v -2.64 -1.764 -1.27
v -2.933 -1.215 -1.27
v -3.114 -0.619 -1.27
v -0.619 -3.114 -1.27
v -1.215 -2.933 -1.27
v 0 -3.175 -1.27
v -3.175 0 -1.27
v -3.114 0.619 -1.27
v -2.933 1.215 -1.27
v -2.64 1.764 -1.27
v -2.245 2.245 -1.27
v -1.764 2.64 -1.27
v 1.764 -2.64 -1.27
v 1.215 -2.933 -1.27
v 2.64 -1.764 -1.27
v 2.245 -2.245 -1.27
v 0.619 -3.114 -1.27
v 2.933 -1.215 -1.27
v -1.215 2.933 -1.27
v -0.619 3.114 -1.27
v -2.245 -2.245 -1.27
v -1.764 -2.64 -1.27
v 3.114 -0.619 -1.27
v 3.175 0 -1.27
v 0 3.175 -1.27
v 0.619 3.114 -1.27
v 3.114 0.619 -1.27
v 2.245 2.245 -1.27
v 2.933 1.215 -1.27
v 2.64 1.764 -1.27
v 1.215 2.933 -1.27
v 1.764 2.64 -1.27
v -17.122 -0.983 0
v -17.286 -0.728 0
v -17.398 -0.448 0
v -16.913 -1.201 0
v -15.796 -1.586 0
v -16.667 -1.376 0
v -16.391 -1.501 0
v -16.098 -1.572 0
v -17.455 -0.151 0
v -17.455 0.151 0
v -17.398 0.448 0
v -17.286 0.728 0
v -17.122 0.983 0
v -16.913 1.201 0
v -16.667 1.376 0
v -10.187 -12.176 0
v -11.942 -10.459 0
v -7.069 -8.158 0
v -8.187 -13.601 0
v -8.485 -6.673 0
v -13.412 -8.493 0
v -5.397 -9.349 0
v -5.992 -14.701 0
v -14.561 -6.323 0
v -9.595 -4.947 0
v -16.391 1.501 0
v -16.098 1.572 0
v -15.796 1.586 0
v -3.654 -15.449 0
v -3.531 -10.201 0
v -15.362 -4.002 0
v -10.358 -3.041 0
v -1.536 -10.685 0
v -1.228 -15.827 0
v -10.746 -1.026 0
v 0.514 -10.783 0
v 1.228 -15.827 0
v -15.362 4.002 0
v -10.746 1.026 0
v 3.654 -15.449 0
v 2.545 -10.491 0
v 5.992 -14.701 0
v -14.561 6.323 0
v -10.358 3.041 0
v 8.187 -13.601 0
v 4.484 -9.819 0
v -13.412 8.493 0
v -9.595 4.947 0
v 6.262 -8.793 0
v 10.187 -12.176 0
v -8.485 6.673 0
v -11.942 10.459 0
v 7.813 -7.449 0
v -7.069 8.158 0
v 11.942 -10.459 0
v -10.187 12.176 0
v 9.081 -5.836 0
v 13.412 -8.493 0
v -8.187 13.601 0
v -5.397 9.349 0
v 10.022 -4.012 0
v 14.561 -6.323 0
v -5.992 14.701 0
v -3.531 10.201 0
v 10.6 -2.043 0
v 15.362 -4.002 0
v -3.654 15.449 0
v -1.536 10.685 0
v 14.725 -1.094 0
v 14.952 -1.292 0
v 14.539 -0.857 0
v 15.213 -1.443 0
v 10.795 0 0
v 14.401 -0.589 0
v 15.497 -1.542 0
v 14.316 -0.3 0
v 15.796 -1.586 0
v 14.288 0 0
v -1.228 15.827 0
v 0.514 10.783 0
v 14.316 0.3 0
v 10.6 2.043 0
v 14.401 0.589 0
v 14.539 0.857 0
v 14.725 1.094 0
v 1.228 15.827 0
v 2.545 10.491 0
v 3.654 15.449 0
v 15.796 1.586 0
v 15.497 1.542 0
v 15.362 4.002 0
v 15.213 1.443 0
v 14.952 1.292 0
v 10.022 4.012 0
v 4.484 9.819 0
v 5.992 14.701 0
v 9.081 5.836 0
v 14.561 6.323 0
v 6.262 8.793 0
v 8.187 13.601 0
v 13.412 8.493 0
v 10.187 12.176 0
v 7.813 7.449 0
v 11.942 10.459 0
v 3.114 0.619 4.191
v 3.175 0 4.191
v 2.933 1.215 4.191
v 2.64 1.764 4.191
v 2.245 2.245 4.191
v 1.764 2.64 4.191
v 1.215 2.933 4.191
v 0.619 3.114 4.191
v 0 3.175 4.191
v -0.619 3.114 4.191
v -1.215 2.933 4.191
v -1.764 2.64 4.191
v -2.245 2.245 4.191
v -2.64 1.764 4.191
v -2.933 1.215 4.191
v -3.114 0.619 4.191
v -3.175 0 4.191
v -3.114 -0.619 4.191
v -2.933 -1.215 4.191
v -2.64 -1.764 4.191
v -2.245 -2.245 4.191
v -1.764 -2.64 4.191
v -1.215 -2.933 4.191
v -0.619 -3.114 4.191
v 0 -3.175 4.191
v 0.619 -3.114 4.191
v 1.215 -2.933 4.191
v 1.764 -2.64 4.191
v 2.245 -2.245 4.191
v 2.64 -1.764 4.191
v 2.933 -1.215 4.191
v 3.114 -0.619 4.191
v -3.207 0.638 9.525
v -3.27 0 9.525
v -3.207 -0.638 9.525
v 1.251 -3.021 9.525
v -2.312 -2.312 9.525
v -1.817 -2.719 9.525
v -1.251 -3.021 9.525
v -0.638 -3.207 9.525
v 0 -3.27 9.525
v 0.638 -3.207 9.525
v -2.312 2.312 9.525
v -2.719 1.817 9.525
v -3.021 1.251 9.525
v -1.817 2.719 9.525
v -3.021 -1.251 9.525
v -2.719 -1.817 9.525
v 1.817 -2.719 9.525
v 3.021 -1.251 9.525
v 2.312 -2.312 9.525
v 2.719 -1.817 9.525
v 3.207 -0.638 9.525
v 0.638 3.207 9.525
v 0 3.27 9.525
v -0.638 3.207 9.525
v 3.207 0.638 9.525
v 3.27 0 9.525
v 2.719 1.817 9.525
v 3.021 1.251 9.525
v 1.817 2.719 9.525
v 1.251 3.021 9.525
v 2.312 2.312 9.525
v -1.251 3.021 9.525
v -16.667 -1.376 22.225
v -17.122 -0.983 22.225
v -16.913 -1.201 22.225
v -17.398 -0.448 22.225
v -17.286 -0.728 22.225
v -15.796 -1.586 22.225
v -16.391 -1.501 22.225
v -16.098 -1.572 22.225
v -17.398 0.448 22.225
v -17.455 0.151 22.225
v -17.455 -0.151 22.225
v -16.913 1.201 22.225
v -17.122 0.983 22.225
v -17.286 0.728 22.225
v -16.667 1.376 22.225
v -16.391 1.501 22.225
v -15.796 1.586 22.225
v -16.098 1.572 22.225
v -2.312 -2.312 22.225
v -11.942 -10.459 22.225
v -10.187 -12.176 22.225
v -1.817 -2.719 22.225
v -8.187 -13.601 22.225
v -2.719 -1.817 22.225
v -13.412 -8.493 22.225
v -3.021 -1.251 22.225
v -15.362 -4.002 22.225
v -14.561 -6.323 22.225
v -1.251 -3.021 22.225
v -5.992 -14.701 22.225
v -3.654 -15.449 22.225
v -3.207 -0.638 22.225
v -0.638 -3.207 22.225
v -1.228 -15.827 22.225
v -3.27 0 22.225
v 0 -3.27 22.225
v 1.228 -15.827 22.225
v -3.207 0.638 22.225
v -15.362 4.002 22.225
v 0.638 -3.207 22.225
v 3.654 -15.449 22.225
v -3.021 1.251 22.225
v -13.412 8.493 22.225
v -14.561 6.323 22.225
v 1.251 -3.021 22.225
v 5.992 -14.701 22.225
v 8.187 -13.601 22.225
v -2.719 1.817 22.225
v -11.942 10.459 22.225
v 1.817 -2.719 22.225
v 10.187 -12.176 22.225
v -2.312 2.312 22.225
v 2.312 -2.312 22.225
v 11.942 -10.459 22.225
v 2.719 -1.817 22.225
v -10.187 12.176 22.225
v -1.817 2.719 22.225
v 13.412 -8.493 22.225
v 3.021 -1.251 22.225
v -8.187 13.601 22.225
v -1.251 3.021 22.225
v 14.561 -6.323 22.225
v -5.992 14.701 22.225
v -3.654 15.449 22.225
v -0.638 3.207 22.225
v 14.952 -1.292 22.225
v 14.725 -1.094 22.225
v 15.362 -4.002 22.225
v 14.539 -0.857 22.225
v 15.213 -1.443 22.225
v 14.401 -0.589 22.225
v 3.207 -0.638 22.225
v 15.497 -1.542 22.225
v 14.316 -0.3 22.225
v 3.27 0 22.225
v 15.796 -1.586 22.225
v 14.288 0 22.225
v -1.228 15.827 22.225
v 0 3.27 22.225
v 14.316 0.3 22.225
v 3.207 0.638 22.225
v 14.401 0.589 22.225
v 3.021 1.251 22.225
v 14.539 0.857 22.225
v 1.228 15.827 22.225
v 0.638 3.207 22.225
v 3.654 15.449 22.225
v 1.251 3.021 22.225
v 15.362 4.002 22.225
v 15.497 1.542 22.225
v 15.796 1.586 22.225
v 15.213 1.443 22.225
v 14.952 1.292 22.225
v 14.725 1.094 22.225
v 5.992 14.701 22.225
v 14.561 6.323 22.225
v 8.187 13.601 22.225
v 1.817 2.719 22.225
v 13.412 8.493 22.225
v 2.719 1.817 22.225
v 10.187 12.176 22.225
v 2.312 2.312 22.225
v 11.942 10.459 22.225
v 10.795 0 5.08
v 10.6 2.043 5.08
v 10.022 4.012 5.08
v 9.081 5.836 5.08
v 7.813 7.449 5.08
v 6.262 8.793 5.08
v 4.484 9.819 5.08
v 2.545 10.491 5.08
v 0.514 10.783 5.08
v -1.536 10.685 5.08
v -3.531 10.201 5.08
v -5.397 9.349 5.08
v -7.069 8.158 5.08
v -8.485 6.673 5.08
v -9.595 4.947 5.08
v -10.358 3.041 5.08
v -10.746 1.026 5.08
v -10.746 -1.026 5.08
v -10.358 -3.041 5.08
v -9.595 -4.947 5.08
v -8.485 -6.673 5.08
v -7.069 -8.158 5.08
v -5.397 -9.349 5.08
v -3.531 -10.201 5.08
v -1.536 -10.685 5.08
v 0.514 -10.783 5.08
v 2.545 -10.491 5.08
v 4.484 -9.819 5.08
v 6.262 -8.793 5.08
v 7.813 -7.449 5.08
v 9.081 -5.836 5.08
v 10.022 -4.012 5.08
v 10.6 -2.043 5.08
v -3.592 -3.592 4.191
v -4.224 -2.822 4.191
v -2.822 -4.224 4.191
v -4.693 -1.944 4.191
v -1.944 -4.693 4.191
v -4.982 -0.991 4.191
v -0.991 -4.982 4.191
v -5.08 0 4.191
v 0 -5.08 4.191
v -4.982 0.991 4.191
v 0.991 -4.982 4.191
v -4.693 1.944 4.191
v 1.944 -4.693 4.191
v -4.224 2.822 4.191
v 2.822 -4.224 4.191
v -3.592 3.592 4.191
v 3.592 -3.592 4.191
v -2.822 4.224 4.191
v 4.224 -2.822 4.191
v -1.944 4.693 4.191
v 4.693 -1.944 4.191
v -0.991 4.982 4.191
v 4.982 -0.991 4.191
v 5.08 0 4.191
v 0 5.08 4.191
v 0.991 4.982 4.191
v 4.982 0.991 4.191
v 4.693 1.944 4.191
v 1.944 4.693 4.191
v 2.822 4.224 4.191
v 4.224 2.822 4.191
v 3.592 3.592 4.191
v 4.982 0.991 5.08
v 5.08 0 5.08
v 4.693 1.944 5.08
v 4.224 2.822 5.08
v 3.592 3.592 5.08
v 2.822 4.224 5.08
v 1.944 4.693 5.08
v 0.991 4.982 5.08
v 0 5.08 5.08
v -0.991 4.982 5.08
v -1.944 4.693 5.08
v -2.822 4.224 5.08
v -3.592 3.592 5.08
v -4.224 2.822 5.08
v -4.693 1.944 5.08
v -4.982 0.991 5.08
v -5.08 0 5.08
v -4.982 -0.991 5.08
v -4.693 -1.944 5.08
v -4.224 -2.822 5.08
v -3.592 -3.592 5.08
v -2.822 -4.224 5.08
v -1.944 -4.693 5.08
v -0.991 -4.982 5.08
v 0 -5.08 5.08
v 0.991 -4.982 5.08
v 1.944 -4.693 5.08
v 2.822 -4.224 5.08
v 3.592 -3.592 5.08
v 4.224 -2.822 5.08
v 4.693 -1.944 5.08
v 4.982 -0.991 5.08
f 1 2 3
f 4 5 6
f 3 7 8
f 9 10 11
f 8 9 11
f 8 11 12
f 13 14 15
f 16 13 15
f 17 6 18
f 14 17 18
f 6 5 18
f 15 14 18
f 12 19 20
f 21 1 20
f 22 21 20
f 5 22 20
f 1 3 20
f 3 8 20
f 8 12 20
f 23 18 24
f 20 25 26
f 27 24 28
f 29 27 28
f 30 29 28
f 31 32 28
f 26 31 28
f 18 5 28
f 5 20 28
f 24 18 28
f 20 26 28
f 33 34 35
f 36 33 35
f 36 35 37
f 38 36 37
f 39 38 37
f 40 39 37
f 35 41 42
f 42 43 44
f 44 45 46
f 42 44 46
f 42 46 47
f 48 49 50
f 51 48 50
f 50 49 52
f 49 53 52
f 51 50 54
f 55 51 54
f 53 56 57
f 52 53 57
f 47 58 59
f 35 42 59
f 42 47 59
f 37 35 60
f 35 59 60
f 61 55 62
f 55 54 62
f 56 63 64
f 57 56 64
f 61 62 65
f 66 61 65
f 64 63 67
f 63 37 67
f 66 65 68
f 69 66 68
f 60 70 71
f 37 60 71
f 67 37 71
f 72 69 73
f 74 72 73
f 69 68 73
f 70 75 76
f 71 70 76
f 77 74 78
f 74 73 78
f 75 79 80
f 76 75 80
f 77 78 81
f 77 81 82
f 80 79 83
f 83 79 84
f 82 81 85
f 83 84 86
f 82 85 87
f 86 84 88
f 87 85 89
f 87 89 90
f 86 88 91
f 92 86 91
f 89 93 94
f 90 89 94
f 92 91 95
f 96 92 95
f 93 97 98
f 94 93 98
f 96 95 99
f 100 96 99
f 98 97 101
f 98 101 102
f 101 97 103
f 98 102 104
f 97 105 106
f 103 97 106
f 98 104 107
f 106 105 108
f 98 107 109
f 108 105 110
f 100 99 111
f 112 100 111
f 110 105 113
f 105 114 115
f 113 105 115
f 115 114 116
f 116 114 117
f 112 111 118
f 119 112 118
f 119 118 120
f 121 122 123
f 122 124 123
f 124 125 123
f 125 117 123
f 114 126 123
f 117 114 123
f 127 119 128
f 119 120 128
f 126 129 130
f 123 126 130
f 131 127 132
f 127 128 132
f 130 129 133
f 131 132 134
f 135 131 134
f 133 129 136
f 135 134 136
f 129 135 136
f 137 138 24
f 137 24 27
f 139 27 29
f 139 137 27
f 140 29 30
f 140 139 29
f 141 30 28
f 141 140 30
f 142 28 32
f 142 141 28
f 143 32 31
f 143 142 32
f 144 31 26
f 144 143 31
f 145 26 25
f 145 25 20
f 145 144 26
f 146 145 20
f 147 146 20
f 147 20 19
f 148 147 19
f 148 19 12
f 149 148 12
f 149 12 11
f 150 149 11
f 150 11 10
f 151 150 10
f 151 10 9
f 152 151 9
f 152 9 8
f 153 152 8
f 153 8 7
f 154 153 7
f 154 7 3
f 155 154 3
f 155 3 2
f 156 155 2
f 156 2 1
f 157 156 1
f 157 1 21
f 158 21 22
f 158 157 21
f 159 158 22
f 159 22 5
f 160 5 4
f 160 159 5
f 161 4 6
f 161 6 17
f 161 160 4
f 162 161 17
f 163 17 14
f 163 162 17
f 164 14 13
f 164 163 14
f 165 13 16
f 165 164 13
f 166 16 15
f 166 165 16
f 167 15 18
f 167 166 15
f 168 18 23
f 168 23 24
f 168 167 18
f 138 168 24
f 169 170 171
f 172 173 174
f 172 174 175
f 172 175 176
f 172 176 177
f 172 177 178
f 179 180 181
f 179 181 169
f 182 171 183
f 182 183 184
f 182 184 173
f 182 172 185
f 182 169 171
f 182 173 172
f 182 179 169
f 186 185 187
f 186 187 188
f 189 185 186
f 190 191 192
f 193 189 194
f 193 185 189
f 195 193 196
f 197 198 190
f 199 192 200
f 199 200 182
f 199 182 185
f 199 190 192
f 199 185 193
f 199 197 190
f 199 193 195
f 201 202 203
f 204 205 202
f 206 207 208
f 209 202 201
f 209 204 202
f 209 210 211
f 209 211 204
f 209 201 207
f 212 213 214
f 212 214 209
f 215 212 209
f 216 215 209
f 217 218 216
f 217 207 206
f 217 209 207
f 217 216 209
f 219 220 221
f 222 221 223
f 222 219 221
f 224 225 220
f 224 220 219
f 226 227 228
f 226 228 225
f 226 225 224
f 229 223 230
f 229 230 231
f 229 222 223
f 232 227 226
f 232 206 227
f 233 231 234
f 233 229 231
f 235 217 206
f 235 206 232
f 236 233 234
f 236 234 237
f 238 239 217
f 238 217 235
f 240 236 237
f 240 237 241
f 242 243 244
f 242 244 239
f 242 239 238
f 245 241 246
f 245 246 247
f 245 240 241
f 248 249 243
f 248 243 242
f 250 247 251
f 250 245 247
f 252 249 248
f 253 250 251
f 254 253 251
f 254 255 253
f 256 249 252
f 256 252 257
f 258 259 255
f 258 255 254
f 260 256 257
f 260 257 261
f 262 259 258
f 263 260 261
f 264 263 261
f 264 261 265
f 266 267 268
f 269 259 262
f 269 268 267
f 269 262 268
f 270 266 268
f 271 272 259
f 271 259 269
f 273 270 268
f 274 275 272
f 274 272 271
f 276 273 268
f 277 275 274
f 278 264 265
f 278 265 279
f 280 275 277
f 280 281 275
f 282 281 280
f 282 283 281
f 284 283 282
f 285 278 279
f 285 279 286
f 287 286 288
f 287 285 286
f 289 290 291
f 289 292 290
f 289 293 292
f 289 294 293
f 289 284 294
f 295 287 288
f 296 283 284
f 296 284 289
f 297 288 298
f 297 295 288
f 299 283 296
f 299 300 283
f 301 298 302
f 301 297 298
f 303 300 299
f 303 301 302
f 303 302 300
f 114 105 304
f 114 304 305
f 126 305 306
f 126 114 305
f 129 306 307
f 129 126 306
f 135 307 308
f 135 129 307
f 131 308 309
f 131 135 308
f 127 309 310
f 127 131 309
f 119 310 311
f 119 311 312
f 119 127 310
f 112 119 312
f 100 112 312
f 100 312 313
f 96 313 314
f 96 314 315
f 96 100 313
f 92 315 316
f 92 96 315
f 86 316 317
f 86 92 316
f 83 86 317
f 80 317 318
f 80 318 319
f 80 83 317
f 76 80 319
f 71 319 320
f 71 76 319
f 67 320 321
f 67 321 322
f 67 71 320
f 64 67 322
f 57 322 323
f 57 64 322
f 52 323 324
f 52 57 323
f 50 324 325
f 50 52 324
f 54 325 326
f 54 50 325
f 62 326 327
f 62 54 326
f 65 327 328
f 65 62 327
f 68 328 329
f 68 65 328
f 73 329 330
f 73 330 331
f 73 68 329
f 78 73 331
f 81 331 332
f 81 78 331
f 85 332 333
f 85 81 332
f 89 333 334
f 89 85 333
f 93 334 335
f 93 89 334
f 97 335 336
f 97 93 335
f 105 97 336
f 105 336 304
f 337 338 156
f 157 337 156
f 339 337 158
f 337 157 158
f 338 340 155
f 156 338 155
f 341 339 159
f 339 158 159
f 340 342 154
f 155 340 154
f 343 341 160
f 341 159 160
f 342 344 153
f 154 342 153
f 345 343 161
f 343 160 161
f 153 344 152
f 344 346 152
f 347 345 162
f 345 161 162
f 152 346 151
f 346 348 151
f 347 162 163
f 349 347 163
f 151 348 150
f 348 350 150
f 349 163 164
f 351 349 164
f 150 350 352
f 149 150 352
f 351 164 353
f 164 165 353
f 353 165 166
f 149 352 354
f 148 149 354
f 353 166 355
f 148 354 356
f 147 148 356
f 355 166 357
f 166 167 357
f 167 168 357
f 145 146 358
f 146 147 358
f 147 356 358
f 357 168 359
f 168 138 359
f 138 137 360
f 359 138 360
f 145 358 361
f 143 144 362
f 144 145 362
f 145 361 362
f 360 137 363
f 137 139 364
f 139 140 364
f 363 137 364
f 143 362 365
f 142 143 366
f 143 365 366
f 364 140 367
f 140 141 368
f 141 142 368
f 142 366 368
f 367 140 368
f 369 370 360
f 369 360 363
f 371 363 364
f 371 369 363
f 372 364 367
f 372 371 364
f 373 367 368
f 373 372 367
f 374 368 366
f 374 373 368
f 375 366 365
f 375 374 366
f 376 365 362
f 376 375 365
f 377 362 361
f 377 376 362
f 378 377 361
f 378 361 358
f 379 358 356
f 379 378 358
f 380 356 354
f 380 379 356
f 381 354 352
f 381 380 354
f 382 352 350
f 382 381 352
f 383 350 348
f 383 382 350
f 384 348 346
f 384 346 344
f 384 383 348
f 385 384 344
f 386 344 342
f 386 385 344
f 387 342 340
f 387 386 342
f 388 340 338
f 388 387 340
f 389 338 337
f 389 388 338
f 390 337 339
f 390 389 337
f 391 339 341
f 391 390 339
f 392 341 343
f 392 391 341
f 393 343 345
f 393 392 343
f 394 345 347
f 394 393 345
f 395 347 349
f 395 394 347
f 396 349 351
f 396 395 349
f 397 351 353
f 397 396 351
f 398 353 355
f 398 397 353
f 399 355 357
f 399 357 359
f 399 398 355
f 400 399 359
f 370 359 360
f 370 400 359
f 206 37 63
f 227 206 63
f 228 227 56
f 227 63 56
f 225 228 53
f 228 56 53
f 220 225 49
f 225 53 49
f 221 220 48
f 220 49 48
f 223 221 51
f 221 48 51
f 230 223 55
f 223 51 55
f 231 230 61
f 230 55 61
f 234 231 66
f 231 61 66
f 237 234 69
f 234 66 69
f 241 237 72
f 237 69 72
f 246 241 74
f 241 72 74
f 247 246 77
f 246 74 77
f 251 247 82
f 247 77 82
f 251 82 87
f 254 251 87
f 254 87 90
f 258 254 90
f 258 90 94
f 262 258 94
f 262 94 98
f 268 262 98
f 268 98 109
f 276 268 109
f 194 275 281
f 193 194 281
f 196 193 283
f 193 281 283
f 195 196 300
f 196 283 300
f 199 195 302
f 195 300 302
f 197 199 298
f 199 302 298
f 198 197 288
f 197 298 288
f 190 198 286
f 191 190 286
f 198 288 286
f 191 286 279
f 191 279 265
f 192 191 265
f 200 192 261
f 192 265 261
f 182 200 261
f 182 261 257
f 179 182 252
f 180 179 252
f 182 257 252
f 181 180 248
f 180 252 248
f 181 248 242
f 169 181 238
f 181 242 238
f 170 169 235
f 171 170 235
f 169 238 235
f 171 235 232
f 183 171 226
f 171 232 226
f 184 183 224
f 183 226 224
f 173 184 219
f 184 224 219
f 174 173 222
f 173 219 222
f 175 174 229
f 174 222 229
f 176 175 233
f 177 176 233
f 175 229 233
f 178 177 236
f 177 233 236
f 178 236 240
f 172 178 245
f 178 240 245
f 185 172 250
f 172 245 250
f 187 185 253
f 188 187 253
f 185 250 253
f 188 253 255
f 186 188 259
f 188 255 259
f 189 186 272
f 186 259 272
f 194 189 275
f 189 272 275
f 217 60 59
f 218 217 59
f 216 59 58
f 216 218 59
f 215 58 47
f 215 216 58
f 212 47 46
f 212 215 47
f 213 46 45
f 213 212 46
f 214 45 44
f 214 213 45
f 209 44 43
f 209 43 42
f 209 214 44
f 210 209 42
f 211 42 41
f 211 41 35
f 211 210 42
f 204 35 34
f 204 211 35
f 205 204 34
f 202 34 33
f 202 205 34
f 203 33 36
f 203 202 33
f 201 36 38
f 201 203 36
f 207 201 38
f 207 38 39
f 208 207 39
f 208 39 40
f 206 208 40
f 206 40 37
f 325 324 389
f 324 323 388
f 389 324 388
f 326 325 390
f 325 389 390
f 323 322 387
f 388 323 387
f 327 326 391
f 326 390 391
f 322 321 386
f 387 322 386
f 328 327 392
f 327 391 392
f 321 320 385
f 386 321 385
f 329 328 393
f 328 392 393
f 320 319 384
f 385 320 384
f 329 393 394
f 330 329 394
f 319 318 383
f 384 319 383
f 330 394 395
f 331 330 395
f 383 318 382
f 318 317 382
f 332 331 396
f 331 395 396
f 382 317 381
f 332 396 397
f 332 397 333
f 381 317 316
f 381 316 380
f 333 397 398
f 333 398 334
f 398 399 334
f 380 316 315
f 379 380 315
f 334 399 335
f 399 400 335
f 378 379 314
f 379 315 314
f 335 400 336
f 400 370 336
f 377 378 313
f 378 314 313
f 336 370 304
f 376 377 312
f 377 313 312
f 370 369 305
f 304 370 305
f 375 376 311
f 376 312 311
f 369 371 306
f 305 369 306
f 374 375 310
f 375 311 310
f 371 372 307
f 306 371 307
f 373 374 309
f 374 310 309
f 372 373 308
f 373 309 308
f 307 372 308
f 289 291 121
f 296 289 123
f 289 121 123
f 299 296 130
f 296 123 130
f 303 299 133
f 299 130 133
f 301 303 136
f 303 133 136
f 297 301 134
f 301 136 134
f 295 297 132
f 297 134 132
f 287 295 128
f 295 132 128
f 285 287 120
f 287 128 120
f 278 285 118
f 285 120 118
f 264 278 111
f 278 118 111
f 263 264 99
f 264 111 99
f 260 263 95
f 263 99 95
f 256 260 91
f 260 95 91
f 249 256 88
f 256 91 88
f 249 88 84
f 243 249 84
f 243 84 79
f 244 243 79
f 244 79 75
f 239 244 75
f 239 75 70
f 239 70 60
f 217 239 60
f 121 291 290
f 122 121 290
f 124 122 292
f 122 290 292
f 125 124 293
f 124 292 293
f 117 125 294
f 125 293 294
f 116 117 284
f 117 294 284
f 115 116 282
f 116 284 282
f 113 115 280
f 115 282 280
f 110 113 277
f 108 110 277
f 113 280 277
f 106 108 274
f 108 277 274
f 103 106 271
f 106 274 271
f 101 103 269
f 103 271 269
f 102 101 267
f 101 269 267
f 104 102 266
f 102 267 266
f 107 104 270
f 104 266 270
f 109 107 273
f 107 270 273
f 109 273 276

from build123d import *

# Parameters (mm, degrees)
SKETCH1_R           = 15.875
BOSS_EXTRUDE1_DEPTH = 22.225
SKETCH1_3_R         = 10.795
CUT_EXTRUDE1_DEPTH  = 5.08
BOSS_EXTRUDE2_START = 5.08
SKETCH1_4_R         = 5.08
BOSS_EXTRUDE2_DEPTH = 0.889
BOSS_EXTRUDE3_START = 5.08
SKETCH1_5_R         = 3.175
BOSS_EXTRUDE3_DEPTH = 6.35
SKETCH2_R           = 3.27025
CUT_EXTRUDE2_DEPTH  = 12.7
SKETCH3_R           = 1.5875
CUT_EXTRUDE4_DEPTH  = 24.495
SKETCH3_3_R         = 1.5875
BOSS_EXTRUDE4_DEPTH = 22.225


with BuildPart() as part:
    # Sketch1 → Boss-Extrude1 (new body)
    with BuildSketch(Plane.XY):
        Circle(SKETCH1_R)
    extrude(amount=BOSS_EXTRUDE1_DEPTH)

    # Sketch1<3> → Cut-Extrude1 (cut)
    with BuildSketch(Plane.XY):
        Circle(SKETCH1_3_R)
    extrude(amount=CUT_EXTRUDE1_DEPTH, mode=Mode.SUBTRACT)

    # Sketch1<4> → Boss-Extrude2 (add)
    with BuildSketch(Plane.XY.offset(BOSS_EXTRUDE2_START)):
        Circle(SKETCH1_4_R)
    extrude(amount=-BOSS_EXTRUDE2_DEPTH)

    # Sketch1<5> → Boss-Extrude3 (add)
    with BuildSketch(Plane.XY.offset(BOSS_EXTRUDE3_START)):
        Circle(SKETCH1_5_R)
    extrude(amount=-BOSS_EXTRUDE3_DEPTH)

    # Sketch2 → Cut-Extrude2 (cut)
    with BuildSketch(Plane.XY.offset(22.225)):
        Circle(SKETCH2_R)
    extrude(amount=-CUT_EXTRUDE2_DEPTH, mode=Mode.SUBTRACT)

    # Sketch3 → Cut-Extrude4 (cut, through all)
    with BuildSketch(Plane.XY.offset(22.225)):
        with Locations((15.875, 0)):
            Circle(SKETCH3_R)
    extrude(amount=-CUT_EXTRUDE4_DEPTH, mode=Mode.SUBTRACT)

    # Sketch3<3> → Boss-Extrude4 (add)
    with BuildSketch(Plane.XY.offset(22.225)):
        with Locations((-15.875, 0)):
            Circle(SKETCH3_3_R)
    extrude(amount=-BOSS_EXTRUDE4_DEPTH)


solid = part.part
